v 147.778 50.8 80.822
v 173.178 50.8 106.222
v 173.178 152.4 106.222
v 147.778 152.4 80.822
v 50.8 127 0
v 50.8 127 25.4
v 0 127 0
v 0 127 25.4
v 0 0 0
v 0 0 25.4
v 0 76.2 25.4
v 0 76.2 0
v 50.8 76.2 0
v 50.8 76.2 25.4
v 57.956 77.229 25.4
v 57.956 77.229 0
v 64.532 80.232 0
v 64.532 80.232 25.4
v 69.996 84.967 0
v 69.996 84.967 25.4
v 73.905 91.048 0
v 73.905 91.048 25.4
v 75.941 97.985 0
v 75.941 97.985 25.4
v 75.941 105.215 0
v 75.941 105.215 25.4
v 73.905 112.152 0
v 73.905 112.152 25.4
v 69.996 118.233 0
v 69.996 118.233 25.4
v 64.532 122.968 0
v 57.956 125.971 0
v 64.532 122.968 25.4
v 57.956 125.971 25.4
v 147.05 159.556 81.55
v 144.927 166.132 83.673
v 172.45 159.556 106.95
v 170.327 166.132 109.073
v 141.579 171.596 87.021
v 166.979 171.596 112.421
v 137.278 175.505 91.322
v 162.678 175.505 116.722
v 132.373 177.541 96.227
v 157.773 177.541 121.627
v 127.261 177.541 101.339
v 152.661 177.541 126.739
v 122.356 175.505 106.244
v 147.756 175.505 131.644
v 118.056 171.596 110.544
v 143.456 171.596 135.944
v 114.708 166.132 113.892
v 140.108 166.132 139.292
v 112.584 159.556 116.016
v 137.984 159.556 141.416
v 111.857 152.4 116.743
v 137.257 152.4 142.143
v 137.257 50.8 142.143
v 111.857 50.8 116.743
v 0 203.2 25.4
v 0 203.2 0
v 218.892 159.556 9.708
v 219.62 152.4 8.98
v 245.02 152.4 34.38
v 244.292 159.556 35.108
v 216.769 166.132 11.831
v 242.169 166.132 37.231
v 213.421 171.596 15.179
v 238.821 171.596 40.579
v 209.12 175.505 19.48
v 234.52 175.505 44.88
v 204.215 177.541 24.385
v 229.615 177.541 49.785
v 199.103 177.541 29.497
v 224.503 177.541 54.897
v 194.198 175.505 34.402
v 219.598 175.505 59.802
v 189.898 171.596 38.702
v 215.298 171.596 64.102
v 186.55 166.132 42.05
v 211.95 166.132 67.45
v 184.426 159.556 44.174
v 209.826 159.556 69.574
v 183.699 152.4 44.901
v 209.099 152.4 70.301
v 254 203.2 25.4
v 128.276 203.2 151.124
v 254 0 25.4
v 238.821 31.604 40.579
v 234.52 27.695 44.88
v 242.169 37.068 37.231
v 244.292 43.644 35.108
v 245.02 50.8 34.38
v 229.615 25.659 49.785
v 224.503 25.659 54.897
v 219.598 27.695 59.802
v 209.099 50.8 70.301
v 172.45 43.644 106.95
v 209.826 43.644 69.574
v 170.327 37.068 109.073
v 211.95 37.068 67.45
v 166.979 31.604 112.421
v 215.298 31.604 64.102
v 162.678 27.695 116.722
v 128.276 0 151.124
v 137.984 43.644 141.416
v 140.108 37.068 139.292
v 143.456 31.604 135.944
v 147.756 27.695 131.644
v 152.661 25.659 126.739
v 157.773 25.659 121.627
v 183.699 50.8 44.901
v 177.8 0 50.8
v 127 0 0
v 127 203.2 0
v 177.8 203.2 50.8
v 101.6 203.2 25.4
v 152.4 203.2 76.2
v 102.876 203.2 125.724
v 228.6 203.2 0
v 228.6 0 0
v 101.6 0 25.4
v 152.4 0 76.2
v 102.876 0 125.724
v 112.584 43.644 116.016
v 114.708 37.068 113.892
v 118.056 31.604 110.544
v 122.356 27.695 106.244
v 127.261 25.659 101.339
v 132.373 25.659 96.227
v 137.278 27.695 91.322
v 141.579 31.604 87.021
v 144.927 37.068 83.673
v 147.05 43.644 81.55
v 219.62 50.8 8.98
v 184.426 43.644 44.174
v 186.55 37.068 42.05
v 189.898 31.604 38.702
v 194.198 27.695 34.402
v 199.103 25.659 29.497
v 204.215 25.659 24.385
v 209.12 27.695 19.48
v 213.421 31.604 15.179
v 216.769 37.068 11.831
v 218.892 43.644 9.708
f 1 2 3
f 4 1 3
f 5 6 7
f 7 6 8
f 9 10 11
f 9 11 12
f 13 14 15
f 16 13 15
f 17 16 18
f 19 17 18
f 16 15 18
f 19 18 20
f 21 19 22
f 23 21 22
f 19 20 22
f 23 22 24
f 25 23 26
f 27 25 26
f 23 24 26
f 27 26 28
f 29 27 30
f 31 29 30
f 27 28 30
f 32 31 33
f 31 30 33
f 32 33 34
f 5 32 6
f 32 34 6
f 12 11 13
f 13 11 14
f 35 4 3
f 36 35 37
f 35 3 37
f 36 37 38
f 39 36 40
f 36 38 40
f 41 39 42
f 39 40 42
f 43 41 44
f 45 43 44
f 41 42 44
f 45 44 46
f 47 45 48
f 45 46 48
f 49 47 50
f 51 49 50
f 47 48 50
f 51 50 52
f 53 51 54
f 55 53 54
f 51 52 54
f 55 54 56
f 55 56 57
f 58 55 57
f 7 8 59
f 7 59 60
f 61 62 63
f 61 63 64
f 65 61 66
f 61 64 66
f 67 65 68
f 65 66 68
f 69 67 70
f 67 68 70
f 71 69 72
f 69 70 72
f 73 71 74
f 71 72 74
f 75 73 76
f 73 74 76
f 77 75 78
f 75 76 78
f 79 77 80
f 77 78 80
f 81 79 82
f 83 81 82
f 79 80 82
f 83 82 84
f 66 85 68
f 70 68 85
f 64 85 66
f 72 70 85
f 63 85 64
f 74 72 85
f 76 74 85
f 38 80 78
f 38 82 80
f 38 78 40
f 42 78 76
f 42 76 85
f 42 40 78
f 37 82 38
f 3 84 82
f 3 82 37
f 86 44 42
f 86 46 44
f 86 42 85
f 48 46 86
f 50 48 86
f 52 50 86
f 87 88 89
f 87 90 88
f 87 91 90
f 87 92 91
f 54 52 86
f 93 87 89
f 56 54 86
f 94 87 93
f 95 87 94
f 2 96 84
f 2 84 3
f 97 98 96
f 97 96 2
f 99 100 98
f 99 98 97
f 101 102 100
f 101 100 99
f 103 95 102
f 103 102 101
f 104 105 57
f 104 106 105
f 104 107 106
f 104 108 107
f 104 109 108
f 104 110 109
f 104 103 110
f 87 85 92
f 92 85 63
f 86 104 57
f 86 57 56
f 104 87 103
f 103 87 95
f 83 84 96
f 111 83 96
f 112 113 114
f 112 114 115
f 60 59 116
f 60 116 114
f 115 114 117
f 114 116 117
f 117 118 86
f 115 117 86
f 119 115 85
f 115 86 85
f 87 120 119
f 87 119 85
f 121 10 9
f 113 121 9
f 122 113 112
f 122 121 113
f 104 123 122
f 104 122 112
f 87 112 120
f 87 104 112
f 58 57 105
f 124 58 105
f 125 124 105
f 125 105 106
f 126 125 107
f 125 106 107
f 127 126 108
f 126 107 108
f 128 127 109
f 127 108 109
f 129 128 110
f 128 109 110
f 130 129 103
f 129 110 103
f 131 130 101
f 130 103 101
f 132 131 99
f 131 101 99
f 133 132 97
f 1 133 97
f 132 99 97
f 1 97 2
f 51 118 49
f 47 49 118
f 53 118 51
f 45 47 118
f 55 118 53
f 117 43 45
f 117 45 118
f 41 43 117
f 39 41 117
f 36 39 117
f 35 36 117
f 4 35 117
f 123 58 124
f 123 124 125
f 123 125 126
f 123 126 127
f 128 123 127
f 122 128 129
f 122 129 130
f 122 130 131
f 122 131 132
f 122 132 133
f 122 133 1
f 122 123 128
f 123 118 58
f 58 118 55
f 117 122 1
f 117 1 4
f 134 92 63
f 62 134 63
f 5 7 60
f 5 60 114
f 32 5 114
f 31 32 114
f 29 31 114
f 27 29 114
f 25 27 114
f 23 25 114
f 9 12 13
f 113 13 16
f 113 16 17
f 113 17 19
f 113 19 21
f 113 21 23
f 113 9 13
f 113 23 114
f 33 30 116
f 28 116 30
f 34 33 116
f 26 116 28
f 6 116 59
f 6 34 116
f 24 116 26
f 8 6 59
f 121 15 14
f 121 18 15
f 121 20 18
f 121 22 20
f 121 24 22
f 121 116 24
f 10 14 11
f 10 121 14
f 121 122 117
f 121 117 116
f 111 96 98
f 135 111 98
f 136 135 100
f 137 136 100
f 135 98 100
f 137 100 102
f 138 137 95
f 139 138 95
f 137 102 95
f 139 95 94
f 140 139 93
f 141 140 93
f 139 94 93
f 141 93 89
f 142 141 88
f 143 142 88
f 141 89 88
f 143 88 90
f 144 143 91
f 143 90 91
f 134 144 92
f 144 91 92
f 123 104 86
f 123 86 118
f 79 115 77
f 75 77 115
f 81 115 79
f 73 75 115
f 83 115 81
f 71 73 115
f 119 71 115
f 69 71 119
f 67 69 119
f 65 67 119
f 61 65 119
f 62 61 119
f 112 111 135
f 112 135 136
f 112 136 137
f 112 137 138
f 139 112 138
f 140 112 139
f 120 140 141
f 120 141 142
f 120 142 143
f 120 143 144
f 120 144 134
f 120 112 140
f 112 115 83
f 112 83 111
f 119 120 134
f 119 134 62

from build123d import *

# Parameters (mm, degrees)
F1_DEPTH = 203.2
F3_DEPTH = 38.1
F5_DEPTH = 50.8


with BuildPart() as f1:
    # F0 (on Front) → F1 (new body)
    with BuildSketch(Plane.XZ):
        Polygon((0, 25.4), (0, 0), (127, 0), (177.8, 50.8), (228.6, 0), (254, 25.4), (128.276414, 151.123586), (102.876414, 125.723586), (152.4, 76.2), (101.6, 25.4), align=None)
    extrude(amount=-F1_DEPTH)

    # F2 (on face) → F3 (cut)
    with BuildSketch(Plane.XY.offset(25.4)):
        with BuildLine():
            Line((0, 76.2), (50.8, 76.2))
            ThreePointArc((50.8, 76.2), (76.2, 101.6), (50.8, 127))
            Line((50.8, 127), (0, 127))
            Line((0, 127), (0, 76.2))
        make_face()
    extrude(amount=-F3_DEPTH, mode=Mode.SUBTRACT)

    # F4 (on face) → F5 (cut)
    with BuildSketch(Plane(origin=(139.7, 0, 139.7), x_dir=(0.707107, 0, -0.707107), z_dir=(0.707107, 0, 0.707107))):
        with BuildLine():
            Line((-3.45539, 152.4), (-3.45539, 50.8))
            ThreePointArc((-3.45539, 50.8), (21.94461, 25.4), (47.34461, 50.8))
            Line((47.34461, 50.8), (47.34461, 152.4))
            ThreePointArc((47.34461, 152.4), (21.94461, 177.8), (-3.45539, 152.4))
        make_face()
        with BuildLine():
            Line((98.14461, 152.4), (98.14461, 50.8))
            ThreePointArc((98.14461, 50.8), (123.54461, 25.4), (148.94461, 50.8))
            Line((148.94461, 50.8), (148.94461, 152.4))
            ThreePointArc((148.94461, 152.4), (123.54461, 177.8), (98.14461, 152.4))
        make_face()
    extrude(amount=-F5_DEPTH, mode=Mode.SUBTRACT)


solid = f1.part
